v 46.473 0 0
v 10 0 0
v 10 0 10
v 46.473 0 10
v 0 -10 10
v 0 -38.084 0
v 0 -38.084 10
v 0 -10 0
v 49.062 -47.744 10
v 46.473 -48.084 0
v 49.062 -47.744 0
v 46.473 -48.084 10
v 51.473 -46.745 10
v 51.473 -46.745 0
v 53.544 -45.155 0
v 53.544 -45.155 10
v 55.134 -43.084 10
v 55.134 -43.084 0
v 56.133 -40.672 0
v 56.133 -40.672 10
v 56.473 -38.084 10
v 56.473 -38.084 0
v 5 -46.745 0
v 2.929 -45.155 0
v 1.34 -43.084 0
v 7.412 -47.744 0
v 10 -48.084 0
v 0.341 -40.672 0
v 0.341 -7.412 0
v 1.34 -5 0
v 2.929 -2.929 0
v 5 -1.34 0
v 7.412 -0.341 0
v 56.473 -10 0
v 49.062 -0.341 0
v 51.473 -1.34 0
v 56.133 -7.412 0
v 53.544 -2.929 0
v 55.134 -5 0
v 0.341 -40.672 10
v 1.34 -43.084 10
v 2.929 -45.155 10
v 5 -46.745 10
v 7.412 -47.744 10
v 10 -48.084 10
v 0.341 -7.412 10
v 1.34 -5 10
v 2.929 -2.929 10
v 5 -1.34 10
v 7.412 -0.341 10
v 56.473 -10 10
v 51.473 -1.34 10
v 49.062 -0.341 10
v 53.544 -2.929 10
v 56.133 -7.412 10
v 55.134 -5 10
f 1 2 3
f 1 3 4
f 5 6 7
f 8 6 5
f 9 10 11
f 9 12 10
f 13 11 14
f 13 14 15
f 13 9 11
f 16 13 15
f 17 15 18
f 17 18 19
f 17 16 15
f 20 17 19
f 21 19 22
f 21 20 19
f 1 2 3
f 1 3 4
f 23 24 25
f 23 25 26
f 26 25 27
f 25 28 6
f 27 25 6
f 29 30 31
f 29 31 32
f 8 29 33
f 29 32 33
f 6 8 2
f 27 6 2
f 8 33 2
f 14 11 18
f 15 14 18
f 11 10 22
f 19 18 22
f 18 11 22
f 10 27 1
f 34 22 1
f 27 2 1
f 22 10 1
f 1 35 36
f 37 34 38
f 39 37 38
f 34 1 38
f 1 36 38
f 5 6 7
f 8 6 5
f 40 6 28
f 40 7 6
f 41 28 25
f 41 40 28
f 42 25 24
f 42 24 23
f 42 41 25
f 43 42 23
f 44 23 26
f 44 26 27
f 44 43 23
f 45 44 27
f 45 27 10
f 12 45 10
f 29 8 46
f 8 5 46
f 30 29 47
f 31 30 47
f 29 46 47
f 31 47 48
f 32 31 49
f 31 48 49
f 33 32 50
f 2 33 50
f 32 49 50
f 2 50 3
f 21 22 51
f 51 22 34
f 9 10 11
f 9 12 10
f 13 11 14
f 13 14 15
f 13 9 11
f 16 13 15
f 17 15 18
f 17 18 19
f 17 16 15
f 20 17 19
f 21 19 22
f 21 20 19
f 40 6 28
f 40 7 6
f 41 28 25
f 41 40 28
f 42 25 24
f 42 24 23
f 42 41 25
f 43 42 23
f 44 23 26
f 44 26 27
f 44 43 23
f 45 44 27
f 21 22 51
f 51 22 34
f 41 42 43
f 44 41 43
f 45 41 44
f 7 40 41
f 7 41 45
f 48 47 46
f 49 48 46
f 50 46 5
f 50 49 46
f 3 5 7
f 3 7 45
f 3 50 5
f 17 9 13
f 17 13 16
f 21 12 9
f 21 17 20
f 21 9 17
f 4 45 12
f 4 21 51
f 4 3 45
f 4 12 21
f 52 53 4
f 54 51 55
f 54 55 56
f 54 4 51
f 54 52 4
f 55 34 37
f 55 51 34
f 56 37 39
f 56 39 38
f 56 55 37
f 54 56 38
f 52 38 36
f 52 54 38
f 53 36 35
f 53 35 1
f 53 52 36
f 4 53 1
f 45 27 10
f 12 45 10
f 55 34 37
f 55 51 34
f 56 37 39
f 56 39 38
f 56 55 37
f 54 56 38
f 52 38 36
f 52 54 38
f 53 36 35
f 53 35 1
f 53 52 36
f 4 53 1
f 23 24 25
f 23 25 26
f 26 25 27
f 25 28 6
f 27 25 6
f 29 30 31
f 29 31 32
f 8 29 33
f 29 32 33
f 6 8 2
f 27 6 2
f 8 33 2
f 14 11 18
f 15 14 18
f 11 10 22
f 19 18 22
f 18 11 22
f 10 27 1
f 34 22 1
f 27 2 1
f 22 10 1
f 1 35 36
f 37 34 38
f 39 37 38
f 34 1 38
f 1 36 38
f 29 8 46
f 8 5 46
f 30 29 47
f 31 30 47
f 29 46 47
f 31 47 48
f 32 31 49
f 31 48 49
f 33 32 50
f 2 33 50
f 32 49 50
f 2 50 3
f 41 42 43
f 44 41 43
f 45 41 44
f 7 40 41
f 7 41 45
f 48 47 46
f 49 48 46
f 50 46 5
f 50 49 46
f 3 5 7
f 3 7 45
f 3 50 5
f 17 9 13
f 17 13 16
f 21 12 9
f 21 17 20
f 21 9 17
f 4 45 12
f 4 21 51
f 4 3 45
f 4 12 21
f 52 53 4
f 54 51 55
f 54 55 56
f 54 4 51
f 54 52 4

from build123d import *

# Parameters (mm, degrees)
F0_W     = 56.473431
F0_H     = 48.084262
F1_DEPTH = 10
F2_R     = 10
F3_W     = 56.473431
F3_H     = 48.084262
F4_DEPTH = 10
F5_R     = 10


with BuildPart() as f1:
    # F0 (on Top) → F1 (new body)
    with BuildSketch(Plane.XY):
        with Locations((28.236715, -24.042131)):
            Rectangle(F0_W, F0_H)
    extrude(amount=F1_DEPTH)

    # F2
    f2_edges = [f1.edges().sort_by_distance(p)[0] for p in [
        (56.473431, 0, 5),
        (0, 0, 5),
        (0, -48.084262, 5),
        (56.473431, -48.084262, 5),
    ]]
    fillet(f2_edges, radius=F2_R)


with BuildPart() as f4:
    # F3 (on Top) → F4 (new body)
    with BuildSketch(Plane.XY):
        with Locations((28.236715, -24.042131)):
            Rectangle(F3_W, F3_H)
    extrude(amount=F4_DEPTH)

    # F5
    f5_edges = [f4.edges().sort_by_distance(p)[0] for p in [
        (56.473431, 0, 5),
        (0, 0, 5),
        (0, -48.084262, 5),
        (56.473431, -48.084262, 5),
    ]]
    fillet(f5_edges, radius=F5_R)


solid = Compound([f1.part, f4.part])
